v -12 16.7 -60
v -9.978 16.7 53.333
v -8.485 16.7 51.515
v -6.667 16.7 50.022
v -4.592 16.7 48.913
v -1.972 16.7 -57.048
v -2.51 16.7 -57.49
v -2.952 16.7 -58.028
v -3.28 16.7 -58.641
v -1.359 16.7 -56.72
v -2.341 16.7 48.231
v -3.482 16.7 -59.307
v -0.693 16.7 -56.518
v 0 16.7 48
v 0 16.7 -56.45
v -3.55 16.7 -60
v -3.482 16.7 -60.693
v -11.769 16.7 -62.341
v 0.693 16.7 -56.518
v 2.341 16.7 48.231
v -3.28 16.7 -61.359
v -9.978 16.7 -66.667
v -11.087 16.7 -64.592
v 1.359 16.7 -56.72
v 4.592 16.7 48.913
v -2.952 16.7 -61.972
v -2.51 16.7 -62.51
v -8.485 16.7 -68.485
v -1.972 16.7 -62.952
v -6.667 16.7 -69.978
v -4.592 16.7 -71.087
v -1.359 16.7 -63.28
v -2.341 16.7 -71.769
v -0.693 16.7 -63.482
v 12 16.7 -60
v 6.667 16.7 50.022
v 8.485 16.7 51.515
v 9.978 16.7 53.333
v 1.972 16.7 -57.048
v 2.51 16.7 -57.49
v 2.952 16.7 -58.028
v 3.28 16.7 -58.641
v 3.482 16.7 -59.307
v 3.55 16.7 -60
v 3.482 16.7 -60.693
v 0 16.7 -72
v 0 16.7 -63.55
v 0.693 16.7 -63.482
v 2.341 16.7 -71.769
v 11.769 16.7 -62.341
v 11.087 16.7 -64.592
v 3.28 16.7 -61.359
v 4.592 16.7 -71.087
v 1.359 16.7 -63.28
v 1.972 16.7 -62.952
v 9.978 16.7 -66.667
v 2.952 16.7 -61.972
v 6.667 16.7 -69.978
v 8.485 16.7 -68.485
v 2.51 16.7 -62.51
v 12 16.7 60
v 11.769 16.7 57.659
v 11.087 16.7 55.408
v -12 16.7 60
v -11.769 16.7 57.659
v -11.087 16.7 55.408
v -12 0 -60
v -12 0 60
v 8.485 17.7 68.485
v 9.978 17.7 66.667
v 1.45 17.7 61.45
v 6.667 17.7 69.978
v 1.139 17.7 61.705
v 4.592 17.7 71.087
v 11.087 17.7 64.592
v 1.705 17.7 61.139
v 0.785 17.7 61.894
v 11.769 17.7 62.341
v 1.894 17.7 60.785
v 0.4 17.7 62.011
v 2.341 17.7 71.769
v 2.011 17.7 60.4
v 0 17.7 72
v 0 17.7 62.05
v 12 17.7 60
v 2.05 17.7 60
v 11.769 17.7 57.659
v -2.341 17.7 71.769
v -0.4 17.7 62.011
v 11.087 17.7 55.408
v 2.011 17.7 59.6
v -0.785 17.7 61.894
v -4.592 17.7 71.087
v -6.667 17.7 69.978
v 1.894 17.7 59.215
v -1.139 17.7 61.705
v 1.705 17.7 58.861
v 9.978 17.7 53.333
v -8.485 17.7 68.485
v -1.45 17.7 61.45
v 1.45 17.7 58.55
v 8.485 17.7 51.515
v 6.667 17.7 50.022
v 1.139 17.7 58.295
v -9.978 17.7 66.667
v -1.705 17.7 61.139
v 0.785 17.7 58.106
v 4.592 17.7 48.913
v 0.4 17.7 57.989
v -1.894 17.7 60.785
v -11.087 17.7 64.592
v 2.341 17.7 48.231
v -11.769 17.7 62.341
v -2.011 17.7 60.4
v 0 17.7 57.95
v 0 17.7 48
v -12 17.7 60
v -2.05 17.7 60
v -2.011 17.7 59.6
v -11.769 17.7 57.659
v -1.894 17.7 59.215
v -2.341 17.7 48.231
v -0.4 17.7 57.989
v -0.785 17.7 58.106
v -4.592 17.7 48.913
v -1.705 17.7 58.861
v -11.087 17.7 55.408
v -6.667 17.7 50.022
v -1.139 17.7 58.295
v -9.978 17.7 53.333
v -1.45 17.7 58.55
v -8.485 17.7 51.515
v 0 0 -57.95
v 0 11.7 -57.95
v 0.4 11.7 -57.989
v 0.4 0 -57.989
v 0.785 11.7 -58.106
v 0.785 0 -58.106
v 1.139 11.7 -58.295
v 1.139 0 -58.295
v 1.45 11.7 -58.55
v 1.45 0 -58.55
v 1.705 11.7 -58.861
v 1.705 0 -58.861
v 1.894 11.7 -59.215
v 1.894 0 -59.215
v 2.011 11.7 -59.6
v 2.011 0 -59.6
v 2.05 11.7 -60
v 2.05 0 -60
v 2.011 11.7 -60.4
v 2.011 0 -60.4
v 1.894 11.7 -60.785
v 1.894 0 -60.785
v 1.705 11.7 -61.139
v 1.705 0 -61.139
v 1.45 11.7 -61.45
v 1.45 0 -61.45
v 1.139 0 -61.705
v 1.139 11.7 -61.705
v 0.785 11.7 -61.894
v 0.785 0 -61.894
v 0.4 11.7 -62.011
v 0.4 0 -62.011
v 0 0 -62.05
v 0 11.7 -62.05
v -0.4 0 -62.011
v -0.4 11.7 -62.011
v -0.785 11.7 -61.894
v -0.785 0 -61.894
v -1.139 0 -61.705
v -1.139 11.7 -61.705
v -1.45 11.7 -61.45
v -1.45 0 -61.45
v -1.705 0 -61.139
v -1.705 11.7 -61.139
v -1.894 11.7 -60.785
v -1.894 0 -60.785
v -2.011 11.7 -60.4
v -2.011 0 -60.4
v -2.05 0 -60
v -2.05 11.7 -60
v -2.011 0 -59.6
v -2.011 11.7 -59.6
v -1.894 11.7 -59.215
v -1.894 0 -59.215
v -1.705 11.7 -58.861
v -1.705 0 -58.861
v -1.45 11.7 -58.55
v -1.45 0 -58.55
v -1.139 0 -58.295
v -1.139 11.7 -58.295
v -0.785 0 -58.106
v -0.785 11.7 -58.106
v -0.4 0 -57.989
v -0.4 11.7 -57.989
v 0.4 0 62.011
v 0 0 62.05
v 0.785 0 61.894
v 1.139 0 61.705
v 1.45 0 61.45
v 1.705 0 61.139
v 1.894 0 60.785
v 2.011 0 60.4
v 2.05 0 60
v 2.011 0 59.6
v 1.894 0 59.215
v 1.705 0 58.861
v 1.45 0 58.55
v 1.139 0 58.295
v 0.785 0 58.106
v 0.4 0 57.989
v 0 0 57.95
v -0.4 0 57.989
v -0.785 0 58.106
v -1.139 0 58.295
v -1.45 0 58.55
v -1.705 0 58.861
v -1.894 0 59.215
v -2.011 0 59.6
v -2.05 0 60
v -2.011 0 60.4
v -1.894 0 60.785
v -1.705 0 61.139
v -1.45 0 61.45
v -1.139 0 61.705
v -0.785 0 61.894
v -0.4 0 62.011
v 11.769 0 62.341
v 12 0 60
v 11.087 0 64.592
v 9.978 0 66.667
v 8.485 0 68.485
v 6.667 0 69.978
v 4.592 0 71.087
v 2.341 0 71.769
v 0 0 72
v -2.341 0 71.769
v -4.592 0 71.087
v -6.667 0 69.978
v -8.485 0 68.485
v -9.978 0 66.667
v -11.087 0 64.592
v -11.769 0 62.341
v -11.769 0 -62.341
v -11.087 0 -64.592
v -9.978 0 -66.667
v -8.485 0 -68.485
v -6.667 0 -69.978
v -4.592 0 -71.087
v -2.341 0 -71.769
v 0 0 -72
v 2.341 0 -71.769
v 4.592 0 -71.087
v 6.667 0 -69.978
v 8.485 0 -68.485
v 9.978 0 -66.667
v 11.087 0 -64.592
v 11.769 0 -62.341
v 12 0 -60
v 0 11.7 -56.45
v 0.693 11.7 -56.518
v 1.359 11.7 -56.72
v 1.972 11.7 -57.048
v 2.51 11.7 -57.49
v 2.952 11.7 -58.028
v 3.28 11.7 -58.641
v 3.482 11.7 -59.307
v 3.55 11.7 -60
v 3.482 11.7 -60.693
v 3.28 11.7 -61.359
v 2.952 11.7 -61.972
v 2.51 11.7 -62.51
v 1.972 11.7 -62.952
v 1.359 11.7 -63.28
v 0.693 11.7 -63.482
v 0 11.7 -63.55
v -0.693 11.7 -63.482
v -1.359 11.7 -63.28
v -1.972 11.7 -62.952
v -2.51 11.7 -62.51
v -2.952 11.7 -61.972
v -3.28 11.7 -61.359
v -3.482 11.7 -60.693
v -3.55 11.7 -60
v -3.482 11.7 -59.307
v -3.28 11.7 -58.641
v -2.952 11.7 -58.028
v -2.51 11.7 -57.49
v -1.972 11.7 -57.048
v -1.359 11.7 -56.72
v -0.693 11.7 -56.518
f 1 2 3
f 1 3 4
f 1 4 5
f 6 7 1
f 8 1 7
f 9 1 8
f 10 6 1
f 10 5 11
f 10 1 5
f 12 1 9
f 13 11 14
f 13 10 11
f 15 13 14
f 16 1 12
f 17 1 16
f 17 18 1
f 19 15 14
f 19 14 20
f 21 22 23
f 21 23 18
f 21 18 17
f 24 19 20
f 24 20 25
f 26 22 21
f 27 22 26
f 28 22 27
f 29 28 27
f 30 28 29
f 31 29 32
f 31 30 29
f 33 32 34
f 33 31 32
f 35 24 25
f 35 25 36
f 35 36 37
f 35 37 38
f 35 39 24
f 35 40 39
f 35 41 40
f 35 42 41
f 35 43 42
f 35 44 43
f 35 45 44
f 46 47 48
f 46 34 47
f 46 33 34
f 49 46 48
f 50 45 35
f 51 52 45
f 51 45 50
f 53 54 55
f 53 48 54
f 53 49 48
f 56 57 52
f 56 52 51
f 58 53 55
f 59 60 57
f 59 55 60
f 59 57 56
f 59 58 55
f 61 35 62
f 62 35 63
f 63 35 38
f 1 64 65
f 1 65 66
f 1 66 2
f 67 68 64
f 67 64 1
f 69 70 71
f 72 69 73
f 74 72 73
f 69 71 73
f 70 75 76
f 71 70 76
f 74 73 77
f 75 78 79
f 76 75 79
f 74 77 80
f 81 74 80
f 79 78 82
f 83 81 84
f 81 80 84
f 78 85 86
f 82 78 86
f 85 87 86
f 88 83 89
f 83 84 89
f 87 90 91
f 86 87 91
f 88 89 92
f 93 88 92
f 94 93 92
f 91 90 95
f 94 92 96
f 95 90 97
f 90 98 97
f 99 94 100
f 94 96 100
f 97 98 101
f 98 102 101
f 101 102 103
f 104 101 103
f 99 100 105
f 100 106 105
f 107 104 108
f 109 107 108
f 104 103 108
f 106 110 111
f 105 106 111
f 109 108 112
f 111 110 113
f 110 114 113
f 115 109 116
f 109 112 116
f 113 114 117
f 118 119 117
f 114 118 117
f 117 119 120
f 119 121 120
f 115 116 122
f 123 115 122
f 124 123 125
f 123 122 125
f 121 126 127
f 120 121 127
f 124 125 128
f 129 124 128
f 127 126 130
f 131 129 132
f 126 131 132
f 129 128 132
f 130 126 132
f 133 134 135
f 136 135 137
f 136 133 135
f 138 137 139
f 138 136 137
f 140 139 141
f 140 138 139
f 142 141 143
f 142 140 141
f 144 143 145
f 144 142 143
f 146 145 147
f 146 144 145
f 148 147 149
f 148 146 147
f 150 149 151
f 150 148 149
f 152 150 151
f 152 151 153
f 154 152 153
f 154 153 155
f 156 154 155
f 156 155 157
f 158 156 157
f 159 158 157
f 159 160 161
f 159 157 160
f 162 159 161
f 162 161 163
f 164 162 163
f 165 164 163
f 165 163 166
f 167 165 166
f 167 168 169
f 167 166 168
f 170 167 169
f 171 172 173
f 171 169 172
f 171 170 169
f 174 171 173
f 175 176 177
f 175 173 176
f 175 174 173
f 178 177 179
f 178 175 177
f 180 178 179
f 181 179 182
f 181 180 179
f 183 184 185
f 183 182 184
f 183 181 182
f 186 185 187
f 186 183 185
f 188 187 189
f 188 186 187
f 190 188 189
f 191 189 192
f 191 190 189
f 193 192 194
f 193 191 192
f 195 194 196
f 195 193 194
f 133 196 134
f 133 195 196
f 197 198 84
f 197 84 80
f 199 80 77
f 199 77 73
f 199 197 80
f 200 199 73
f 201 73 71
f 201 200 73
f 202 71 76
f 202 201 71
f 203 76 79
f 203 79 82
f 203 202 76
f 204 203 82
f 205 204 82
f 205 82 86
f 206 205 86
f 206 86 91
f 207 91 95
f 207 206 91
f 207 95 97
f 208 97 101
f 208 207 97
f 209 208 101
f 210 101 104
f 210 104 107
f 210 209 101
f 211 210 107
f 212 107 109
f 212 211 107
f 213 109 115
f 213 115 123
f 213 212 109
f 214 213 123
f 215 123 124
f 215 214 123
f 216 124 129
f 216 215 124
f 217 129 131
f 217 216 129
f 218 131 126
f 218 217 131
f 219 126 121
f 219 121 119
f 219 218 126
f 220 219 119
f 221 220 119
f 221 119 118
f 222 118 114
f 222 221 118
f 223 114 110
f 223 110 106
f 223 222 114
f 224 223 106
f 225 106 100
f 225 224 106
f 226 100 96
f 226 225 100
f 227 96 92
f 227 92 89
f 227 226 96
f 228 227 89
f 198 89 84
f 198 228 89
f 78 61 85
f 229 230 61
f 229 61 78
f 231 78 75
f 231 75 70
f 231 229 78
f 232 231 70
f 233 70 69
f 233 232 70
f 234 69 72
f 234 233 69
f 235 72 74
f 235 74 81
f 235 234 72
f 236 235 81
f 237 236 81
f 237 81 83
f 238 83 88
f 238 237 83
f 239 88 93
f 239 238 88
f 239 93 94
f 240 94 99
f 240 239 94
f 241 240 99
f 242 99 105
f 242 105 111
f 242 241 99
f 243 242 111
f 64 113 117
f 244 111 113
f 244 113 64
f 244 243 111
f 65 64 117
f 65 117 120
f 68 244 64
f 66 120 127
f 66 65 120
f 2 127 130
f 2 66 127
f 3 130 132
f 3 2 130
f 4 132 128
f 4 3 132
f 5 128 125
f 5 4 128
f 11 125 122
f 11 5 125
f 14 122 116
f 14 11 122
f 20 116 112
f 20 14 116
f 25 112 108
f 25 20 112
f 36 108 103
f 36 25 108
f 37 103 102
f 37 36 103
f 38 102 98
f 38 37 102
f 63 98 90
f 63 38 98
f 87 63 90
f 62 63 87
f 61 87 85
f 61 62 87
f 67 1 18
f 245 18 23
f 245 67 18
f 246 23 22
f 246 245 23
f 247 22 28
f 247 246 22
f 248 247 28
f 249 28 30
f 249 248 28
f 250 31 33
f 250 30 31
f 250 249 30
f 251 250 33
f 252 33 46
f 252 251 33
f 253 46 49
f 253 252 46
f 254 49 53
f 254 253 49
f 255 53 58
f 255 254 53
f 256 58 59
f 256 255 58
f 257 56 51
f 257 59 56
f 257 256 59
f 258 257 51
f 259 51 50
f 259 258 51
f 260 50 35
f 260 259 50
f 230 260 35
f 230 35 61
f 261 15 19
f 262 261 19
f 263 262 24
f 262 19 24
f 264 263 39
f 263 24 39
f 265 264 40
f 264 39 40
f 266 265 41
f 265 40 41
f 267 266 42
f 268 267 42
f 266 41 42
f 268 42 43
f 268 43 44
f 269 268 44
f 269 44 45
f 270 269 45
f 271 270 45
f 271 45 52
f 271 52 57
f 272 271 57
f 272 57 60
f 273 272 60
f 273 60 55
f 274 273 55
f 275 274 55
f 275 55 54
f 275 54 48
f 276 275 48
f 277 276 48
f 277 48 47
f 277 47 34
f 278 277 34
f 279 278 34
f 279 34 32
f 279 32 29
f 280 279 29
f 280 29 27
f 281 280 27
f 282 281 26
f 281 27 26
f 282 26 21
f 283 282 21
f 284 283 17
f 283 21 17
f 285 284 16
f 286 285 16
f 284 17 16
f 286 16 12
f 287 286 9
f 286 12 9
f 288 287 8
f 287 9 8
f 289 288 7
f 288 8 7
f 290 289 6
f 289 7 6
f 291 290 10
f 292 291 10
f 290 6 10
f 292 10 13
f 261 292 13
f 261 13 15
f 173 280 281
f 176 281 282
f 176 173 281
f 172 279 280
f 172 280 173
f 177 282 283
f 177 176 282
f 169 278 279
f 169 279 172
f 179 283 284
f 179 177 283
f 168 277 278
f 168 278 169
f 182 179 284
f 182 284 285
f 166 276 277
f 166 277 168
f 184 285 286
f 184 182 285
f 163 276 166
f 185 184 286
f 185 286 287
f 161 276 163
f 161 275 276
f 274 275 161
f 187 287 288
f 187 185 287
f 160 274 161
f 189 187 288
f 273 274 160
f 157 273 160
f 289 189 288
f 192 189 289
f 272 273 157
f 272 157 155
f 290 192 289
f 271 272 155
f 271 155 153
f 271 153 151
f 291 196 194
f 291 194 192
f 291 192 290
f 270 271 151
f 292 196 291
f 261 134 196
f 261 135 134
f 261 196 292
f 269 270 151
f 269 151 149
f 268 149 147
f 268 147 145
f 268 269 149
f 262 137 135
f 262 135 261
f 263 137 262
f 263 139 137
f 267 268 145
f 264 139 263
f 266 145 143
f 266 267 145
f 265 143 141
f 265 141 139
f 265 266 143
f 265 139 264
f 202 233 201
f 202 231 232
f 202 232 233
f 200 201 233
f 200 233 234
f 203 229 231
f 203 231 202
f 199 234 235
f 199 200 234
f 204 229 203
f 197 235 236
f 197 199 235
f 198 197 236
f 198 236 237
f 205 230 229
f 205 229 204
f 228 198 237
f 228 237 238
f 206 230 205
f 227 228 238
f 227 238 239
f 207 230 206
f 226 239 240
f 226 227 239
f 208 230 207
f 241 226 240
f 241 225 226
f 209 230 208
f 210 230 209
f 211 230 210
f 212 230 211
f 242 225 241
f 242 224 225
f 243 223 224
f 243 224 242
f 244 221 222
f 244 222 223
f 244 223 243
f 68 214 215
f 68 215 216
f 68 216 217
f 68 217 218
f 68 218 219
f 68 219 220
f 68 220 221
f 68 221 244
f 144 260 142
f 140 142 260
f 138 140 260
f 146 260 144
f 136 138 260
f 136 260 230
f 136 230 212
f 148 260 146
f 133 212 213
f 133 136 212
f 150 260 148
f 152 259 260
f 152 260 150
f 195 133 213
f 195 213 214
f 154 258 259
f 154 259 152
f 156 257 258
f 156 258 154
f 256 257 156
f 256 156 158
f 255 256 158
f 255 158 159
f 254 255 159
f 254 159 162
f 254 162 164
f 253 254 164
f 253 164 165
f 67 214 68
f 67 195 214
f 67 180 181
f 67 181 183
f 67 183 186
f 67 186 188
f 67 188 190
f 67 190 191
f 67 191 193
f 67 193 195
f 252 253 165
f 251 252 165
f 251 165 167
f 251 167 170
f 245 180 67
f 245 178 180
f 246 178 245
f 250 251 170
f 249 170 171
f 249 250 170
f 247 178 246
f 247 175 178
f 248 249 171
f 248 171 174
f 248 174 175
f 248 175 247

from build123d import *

# Parameters (mm, degrees)
SKETCH1_R           = 2.05
BOSS_EXTRUDE1_DEPTH = 17.7
SKETCH2_R           = 3.55
CUT_EXTRUDE1_DEPTH  = 6
CUT_EXTRUDE2_START  = -1
CUT_EXTRUDE2_DEPTH  = 1


with BuildPart() as part:
    # Sketch1 → Boss-Extrude1 (new body)
    with BuildSketch(Plane(origin=(0, 0, 0), x_dir=(1, 0, 0), z_dir=(0, 1, 0))):
        with BuildLine():
            Line((-12, -60), (-12, 60))
            ThreePointArc((-12, 60), (0, 72), (12, 60))
            Line((12, 60), (12, -60))
            ThreePointArc((12, -60), (0, -72), (-12, -60))
        make_face()
        with Locations(Location((0, 60, 0), (0, 0, 270))):
            Circle(SKETCH1_R, mode=Mode.SUBTRACT)
        with Locations(Location((0, -60, 0), (0, 0, 270))):
            Circle(SKETCH1_R, mode=Mode.SUBTRACT)
    extrude(amount=BOSS_EXTRUDE1_DEPTH)

    # Sketch2 → Cut-Extrude1 (cut)
    with BuildSketch(Plane(origin=(0, 17.7, 0), x_dir=(1, 0, 0), z_dir=(0, 1, 0))):
        with Locations(Location((0, 60, 0), (0, 0, 270))):
            Circle(SKETCH2_R)
    extrude(amount=-CUT_EXTRUDE1_DEPTH, mode=Mode.SUBTRACT)

    # Sketch3 → Cut-Extrude2 (cut)
    with BuildSketch(Plane(origin=(0, 17.7, 0), x_dir=(1, 0, 0), z_dir=(0, 1, 0)).offset(CUT_EXTRUDE2_START)):
        with BuildLine():
            Line((12, -60), (12, 60))
            ThreePointArc((12, 60), (0, 72), (-12, 60))
            Line((-12, 60), (-12, -60))
            ThreePointArc((-12, -60), (0, -48), (12, -60))
        make_face()
    extrude(amount=CUT_EXTRUDE2_DEPTH, mode=Mode.SUBTRACT)


solid = part.part
